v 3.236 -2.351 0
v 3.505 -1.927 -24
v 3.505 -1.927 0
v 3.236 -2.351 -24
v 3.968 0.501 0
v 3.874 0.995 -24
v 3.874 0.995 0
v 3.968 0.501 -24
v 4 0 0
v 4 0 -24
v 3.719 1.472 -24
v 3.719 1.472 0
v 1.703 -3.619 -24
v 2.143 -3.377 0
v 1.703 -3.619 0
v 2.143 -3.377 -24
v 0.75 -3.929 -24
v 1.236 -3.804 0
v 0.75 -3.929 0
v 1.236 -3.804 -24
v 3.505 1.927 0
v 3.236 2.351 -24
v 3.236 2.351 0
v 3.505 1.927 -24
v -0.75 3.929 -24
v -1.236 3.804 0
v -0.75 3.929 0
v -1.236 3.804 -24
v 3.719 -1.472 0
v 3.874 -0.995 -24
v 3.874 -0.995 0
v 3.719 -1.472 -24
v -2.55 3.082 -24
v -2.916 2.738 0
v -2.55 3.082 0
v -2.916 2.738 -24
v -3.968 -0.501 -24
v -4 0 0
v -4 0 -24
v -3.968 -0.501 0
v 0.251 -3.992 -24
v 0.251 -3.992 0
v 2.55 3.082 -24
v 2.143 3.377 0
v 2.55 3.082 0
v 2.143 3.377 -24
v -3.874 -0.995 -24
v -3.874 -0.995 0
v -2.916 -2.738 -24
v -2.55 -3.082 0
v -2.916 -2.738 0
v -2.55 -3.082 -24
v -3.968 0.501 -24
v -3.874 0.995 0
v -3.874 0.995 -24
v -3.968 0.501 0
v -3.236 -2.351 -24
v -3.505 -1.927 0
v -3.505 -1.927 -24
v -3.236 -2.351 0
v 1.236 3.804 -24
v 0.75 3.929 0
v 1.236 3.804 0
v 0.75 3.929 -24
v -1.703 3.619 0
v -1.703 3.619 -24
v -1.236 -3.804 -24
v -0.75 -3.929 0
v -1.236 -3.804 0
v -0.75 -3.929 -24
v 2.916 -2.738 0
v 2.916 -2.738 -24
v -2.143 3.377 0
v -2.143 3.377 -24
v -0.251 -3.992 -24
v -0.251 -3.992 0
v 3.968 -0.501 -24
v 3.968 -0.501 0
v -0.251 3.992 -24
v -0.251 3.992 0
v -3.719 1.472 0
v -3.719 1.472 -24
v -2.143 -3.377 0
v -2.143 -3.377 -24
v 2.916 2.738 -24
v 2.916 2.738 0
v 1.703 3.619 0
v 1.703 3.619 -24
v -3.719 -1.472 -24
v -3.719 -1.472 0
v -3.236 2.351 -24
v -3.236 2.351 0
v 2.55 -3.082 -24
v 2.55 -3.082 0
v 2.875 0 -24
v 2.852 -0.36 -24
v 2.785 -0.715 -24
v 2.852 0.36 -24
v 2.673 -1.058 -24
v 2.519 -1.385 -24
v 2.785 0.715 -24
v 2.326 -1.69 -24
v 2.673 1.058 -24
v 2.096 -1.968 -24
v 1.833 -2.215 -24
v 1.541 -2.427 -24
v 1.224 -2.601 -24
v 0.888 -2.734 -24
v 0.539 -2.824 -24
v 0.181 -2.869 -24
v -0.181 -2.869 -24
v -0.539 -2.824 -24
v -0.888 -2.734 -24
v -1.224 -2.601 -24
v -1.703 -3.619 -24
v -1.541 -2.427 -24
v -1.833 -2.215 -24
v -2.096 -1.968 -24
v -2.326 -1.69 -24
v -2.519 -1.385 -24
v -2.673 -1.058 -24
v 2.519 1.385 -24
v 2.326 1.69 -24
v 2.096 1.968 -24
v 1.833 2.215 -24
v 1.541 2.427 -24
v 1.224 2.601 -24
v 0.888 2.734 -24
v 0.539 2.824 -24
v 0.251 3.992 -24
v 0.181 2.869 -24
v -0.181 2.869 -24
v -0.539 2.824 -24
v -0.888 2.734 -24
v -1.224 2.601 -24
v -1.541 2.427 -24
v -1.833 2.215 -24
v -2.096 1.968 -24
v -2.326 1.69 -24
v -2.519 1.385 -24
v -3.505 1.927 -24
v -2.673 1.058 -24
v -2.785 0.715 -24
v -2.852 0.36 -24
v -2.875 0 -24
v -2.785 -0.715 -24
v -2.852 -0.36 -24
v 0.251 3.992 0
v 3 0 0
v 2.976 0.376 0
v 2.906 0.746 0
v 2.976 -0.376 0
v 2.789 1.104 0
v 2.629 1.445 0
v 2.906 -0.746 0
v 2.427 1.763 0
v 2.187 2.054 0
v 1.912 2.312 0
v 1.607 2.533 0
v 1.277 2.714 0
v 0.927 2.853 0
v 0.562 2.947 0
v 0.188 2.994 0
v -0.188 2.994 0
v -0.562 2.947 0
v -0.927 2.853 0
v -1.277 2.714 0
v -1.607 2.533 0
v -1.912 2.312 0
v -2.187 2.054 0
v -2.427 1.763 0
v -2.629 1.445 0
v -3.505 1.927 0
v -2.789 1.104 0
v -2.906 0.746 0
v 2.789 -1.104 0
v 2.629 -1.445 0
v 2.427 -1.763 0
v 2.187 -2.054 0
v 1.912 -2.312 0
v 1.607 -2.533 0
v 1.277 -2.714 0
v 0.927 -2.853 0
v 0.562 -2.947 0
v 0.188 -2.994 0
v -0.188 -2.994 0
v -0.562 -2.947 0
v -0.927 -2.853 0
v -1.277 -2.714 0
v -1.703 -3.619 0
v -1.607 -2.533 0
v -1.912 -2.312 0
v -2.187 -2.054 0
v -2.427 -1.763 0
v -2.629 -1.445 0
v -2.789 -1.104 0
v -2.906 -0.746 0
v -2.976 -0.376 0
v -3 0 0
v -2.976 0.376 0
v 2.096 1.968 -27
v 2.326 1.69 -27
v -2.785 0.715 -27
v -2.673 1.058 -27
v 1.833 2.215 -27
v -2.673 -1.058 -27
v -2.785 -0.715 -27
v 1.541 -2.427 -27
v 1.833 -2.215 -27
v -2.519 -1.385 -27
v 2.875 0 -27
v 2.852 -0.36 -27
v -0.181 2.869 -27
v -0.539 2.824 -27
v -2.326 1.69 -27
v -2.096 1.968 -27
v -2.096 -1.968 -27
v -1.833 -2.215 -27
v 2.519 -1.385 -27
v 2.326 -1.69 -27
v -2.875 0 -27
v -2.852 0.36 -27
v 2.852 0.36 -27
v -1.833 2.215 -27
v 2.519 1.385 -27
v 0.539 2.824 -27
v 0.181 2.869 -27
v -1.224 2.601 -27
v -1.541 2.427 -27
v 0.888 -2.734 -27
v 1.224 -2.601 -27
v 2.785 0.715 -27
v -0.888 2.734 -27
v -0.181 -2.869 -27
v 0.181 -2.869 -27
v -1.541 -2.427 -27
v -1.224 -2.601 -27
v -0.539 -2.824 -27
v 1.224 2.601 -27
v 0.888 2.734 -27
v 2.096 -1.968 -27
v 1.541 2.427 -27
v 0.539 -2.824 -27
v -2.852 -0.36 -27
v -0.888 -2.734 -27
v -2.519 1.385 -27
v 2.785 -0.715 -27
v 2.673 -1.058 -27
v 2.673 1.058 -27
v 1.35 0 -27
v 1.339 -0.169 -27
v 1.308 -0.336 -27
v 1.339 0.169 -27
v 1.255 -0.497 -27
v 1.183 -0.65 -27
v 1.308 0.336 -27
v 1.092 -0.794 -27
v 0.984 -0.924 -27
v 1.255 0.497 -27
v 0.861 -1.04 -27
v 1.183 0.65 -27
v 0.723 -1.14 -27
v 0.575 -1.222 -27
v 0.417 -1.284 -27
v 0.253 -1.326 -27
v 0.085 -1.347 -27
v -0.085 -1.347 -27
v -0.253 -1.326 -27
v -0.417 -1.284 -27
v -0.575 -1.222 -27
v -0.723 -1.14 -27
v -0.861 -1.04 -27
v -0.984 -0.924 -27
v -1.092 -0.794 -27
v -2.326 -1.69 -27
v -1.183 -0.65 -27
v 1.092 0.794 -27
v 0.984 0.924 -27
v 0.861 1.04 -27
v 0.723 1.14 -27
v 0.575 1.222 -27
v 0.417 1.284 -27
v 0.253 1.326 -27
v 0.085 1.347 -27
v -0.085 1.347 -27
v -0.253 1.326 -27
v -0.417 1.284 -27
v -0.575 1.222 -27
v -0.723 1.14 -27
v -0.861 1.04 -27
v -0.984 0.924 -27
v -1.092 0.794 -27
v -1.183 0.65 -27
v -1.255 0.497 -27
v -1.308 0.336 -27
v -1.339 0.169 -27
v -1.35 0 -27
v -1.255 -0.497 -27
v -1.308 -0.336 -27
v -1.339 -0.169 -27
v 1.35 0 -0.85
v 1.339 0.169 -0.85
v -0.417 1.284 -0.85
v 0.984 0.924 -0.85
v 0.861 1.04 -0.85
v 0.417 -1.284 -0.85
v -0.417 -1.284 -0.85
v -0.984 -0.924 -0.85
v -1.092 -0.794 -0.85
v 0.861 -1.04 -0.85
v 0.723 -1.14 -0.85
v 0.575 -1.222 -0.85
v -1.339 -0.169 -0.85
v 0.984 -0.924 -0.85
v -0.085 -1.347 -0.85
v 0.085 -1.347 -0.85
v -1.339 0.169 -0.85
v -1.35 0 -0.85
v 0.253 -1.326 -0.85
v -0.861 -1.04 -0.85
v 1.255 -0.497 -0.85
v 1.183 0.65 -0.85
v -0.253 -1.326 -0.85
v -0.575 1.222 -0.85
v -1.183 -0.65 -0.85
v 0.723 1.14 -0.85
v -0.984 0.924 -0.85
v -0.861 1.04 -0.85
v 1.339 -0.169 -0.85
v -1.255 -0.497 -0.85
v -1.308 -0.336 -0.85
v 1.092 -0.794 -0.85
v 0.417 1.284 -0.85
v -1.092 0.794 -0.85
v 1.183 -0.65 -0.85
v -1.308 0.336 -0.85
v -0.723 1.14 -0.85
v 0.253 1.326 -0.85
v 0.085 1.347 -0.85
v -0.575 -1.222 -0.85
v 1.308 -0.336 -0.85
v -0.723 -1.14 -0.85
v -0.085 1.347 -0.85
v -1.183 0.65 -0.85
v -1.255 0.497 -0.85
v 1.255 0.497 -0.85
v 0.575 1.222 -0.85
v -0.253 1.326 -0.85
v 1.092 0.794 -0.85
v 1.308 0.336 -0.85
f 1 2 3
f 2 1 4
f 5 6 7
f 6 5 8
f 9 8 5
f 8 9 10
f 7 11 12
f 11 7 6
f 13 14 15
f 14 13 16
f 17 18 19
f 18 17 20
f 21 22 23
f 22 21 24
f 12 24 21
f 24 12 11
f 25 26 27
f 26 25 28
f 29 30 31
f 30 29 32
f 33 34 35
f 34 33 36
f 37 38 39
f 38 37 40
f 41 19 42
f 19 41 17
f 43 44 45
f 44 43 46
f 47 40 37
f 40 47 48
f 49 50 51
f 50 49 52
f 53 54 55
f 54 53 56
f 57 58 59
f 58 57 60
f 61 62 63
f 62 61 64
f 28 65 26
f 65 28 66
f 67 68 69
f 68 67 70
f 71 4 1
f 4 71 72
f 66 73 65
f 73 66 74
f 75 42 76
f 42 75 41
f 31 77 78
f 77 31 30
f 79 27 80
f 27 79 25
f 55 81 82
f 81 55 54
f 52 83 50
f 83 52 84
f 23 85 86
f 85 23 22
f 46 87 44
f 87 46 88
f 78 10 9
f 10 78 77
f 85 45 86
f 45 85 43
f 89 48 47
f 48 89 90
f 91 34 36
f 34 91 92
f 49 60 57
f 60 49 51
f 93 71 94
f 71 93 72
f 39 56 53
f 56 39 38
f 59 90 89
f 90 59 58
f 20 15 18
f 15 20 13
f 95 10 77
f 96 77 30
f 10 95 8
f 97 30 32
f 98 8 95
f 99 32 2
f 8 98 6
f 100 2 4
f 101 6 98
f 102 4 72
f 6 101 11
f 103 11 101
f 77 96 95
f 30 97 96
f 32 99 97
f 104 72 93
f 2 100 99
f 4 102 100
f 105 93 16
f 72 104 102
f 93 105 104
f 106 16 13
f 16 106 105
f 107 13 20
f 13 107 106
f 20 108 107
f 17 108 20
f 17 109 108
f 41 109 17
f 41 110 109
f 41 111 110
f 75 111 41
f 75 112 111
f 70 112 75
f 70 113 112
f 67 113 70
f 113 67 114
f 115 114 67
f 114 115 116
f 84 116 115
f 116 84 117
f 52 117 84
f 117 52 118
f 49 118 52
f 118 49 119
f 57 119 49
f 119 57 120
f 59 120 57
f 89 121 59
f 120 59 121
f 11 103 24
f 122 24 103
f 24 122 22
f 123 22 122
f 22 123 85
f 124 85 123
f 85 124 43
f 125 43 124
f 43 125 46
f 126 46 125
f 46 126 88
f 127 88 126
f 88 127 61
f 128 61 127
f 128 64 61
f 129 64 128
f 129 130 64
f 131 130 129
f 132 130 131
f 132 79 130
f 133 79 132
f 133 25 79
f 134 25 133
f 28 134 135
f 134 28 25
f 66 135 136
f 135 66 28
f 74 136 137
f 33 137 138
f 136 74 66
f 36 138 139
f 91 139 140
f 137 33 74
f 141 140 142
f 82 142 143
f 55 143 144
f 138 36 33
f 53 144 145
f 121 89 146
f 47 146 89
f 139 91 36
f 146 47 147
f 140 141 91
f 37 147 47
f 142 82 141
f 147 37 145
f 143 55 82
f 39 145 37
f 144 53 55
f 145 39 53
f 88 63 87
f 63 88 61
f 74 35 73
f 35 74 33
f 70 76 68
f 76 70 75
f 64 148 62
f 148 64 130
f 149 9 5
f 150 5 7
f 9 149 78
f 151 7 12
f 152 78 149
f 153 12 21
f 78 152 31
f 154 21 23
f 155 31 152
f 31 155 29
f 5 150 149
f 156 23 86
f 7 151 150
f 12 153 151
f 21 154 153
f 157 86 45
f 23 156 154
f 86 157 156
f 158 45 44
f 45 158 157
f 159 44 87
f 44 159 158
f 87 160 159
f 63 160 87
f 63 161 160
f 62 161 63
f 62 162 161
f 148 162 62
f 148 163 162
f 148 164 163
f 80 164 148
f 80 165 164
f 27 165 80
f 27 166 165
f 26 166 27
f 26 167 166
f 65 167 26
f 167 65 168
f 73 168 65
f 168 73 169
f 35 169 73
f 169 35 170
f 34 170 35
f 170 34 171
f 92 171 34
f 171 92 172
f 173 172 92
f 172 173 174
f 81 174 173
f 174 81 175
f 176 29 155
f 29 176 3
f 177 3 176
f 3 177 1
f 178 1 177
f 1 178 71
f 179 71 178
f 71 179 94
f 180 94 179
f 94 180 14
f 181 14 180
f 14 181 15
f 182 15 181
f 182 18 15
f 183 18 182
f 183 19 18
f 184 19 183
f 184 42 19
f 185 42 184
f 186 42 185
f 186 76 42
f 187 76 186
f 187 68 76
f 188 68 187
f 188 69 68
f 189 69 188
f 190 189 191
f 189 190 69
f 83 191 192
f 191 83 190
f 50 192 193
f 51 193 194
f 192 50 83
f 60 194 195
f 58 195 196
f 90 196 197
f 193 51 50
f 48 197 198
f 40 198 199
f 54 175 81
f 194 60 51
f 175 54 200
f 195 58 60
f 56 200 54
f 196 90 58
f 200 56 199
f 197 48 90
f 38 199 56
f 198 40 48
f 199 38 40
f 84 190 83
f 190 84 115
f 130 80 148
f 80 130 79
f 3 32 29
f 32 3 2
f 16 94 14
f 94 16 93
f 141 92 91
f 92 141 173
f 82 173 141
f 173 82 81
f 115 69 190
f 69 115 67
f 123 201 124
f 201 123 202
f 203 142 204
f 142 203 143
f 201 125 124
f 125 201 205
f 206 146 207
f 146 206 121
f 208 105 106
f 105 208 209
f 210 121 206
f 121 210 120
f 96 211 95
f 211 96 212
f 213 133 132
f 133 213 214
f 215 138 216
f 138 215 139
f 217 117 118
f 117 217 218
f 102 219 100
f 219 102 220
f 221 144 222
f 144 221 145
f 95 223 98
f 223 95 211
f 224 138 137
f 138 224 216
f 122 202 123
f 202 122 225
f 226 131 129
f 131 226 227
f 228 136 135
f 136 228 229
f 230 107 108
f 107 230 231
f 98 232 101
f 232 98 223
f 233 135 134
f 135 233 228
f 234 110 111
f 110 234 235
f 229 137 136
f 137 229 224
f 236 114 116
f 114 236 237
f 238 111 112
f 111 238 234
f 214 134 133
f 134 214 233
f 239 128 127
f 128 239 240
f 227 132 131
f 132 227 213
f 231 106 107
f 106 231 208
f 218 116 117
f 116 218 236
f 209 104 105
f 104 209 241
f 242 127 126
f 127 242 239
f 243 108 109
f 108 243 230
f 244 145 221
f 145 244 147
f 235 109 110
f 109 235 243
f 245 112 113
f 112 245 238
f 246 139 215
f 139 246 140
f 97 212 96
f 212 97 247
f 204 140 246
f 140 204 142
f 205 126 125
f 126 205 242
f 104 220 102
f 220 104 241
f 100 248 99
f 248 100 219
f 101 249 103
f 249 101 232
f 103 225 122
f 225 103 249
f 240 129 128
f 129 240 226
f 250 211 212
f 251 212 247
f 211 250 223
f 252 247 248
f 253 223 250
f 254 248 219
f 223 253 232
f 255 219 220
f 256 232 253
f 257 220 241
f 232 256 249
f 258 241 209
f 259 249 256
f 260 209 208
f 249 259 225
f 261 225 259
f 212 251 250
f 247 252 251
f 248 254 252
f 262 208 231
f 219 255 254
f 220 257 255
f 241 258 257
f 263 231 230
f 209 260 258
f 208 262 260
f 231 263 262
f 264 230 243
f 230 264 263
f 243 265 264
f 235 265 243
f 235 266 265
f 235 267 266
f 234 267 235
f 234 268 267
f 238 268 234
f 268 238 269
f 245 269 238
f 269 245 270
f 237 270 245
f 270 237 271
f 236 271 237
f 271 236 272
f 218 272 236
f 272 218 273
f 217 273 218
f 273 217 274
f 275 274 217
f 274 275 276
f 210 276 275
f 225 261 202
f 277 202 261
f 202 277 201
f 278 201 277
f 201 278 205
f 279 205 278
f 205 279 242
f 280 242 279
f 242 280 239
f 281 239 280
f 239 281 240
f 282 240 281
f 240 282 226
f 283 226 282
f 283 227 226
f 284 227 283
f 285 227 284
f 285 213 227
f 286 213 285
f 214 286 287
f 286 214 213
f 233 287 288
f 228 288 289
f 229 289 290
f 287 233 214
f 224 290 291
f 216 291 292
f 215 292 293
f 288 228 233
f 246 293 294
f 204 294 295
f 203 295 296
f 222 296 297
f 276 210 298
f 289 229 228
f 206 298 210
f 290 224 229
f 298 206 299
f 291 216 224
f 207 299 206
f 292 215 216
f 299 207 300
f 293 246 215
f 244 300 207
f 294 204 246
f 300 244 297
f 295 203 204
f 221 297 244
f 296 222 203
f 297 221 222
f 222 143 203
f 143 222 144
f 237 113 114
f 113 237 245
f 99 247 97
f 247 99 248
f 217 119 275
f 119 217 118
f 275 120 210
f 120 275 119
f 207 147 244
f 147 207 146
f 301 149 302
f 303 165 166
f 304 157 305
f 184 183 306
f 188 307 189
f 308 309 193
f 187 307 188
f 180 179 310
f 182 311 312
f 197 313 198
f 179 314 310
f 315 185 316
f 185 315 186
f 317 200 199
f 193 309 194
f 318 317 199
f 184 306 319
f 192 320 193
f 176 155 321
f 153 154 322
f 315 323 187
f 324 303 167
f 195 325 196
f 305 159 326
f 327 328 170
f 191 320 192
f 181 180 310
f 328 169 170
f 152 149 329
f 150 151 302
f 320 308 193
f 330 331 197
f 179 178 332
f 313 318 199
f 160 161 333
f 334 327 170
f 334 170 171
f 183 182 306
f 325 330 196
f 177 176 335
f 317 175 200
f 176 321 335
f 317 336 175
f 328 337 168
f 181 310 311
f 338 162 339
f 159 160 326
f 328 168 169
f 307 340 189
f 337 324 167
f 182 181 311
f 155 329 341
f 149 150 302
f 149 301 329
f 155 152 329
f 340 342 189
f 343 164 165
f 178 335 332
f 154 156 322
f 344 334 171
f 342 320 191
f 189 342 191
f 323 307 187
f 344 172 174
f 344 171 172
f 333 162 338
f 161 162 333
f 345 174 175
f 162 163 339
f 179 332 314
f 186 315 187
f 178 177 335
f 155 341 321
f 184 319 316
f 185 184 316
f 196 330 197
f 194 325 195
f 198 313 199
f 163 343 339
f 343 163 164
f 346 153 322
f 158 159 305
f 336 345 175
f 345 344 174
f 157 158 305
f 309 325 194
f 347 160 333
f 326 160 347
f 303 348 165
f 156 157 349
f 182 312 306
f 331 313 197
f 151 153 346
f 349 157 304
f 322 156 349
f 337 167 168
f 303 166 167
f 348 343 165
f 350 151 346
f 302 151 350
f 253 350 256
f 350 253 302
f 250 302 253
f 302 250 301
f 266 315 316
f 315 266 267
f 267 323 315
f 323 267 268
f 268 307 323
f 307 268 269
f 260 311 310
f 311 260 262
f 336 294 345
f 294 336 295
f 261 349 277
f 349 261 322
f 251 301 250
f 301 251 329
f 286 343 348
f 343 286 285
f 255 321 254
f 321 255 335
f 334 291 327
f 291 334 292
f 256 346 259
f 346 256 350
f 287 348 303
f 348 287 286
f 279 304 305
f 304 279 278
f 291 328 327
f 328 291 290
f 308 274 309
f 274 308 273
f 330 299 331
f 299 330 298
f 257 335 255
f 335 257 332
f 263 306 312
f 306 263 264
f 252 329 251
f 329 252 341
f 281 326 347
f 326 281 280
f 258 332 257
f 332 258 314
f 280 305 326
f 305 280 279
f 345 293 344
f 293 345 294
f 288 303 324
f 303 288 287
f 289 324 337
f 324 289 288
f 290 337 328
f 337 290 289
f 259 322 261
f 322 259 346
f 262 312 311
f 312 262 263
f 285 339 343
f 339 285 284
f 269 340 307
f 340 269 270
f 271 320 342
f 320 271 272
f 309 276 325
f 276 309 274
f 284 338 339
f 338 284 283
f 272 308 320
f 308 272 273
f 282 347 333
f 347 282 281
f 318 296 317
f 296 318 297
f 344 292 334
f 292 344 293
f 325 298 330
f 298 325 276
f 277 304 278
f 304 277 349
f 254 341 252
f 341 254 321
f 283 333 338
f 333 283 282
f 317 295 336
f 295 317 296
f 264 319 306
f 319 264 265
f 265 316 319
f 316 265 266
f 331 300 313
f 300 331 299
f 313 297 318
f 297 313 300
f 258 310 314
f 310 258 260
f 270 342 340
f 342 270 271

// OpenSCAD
$fn = 50;

difference() {
	union() {
		translate(v = [0, 0, -24.0]) {
			cylinder(h = 24, r = 4.0);
		}
		#translate(v = [0, 0, -27.0]) {
			cylinder(h = 27, r = 2.875);
		}
	}
	union() {
		translate(v = [0, 0, 0]) {
			rotate(a = [0, 0, 0]) {
				difference() {
					union() {
						translate(v = [0, 0, -27.0]) {
							cylinder(h = 27, r = 1.0);
						}
						translate(v = [0, 0, -0.85]) {
							cylinder(h = 0.85, r1 = 1.35, r2 = 3.0);
						}
						translate(v = [0, 0, -27.0]) {
							cylinder(h = 27, r = 1.35);
						}
						translate(v = [0, 0, -27.0]) {
							cylinder(h = 27, r = 1.0);
						}
					}
					union();
				}
			}
		}
	}
}
